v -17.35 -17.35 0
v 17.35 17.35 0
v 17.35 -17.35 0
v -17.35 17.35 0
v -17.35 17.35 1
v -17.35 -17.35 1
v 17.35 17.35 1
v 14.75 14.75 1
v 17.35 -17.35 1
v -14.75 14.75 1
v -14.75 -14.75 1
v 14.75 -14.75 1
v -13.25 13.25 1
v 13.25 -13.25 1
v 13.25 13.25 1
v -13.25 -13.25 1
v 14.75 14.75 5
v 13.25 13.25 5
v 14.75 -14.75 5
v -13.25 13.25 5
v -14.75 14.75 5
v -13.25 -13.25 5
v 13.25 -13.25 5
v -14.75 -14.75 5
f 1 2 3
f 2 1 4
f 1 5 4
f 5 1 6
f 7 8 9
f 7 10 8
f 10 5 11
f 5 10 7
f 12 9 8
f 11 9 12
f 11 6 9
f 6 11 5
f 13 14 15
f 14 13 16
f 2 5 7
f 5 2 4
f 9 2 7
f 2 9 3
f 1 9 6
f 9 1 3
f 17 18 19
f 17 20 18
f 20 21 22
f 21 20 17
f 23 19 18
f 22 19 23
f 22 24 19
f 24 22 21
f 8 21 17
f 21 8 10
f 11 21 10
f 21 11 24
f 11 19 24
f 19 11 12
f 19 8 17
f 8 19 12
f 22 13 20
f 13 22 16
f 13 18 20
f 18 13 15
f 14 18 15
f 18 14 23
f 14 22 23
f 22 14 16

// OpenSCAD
// file: ../diffuser.scad
// Swappable diffuser panel. Thickness is the STL knob; the diffusing structure
// (gyroid/grid, density, top/bottom solid layers = 0) is set in the slicer.

module diffuser_panel(t) {
    linear_extrude(t) square([panel_side, panel_side], center = true);
}

// Diffuser LID = flanged plug. The plug drops INTO the opening (locates it, light
// grip so it won't slide); the flange overhangs by ~the wall width and rests on
// the rim so it can't fall through. Lifts straight off for swapping, and works on
// touching chimneys (the plug uses the open hole, not the side walls). The flange
// is the diffuser face (thickness t). Set lid_plug_h = 0 for a plain flat tile.
// Modeled diffuser-face-down (z=0..t) = print orientation; flip in use.
module diffuser_lid(t) {
    fside = cell_inner + 2 * lid_flange_cover - lid_flange_gap;  // flange (rests on the rim)
    pside = cell_inner - lid_plug_clear;                          // plug (drops into the opening)
    union() {
        linear_extrude(t) square([fside, fside], center = true); // flange / diffuser face
        if (lid_plug_h > 0)
            translate([0, 0, t])
                linear_extrude(lid_plug_h)
                    difference() {
                        square([pside, pside], center = true);
                        square([pside - 2 * lid_plug_wall, pside - 2 * lid_plug_wall], center = true);
                    }
    }
}

// Slide-over diffuser CAP: a diffuser top + a skirt that slides over the OUTSIDE
// of a chimney. Only works on an ISOLATED column (needs side clearance for the
// skirt) — kept for possible use on the real letters, NOT the touching coupon.
// Modeled diffuser-face-down (z=0..t) = print orientation.
module diffuser_cap(t) {
    si = cell_pitch + cap_fit_clear;      // skirt inner — slides over the chimney outer
    so = si + 2 * cap_skirt_t;            // skirt outer
    union() {
        linear_extrude(t) square([so, so], center = true);          // diffuser face
        translate([0, 0, t])
            linear_extrude(cap_skirt_h)                             // skirt
                difference() {
                    square([so, so], center = true);
                    square([si, si], center = true);
                }
    }
}
// file: ../config.scad
// ===== CHARGE LED sign — global config =====
// Edit this file; then run ./build.sh to regenerate every STL.

$fn = 72;

// ---- calibrated collar (press-fit for 12mm bullet pixel) ----
collar_stl    = "../../assets/bullet-collar.stl"; // path resolved from src/parts/ entry files
collar_h      = 2.0;     // Z span of the collar STL
collar_od     = 16.0;    // collar outer diameter
collar_cx     = 43.0;    // STL native X center (Y center is 0)
pixel_through = 12.3;    // clearance hole through the plate (just over bore Ø12.19)
dome_clear    = 4.0;     // dome protrusion above plate front. Spec: 5.5mm dome-tip-to-flange,
                         // flange seats on plate back, minus 2mm plate ~= 3.5-4mm. Seat a real
                         // pixel and measure to lock it in.

// ---- shell ----
plate_t    = 2.0;        // rear plate thickness (== collar_h, so the collar sits flush)
wall_t     = 2.5;        // chimney wall thickness
cell_inner = 30;         // square interior of each test cell (the press-fit opening)

// ---- diffuser panels (flat, drop-in — kept for the final glued option) ----
panel_press_clear = 0.25; // panel is this much SMALLER than the opening (total) -> friction fit
panel_thicks      = [1, 2, 3];

// ---- diffuser CAP (slides over an ISOLATED chimney; not used on touching rows) ----
cap_fit_clear = 0.4;   // skirt-inner minus chimney-outer (total); bigger = looser slide
cap_skirt_t   = 1.6;   // skirt wall thickness
cap_skirt_h   = 7;     // how far the skirt grips down over the chimney

// ---- diffuser LID = flanged plug (plug locates in the opening, flange catches on the rim) ----
lid_flange_cover = wall_t;  // flange overhang per side ~= wall width (rests on rim, can't fall in)
lid_flange_gap   = 0.3;     // shrink the flange a hair so neighbour lids don't clash
lid_plug_h       = 4;       // how far the plug drops into the opening (0 = plain flat tile)
lid_plug_clear   = 0.5;     // plug-outer = opening minus this (total) -> snug slip fit
lid_plug_wall    = 1.5;     // plug-frame wall thickness

// ---- coupon depth ladder ----
led_gaps = [20, 35, 50]; // clear LED-tip -> panel distance, per cell (mm)

// ---- collar v2: original bore + lip, plus a 45-deg lead-in chamfer ----
bore_face_r   = 6.10;    // collar bore radius at each face (~Ø12.2)
chamfer_depth = 0.5;     // axial depth of the 45-deg lead-in at each face
mouth_r       = bore_face_r + chamfer_depth;  // chamfer mouth radius (~Ø13.2)

// ---- collar A/B test harness ----
harness_w     = 52;      // tile width
harness_d     = 30;      // tile depth
harness_t     = plate_t; // match the real wall thickness for a faithful fit test
harness_pitch = 24;      // spacing between the two hole centers

// ---- derived ----
cell_pitch = cell_inner + 2 * wall_t;      // outer cell footprint (35)
n_cells    = len(led_gaps);
plate_w    = n_cells * cell_pitch;
plate_d    = cell_pitch;
panel_side = cell_inner - panel_press_clear;
function cell_x(i)     = i * cell_pitch + cell_pitch / 2;
function chimney_H(i)  = plate_t + dome_clear + led_gaps[i];
// main file
// Build target: 1mm flanged-plug diffuser lid.
include <../config.scad>
include <../diffuser.scad>
diffuser_lid(1);
